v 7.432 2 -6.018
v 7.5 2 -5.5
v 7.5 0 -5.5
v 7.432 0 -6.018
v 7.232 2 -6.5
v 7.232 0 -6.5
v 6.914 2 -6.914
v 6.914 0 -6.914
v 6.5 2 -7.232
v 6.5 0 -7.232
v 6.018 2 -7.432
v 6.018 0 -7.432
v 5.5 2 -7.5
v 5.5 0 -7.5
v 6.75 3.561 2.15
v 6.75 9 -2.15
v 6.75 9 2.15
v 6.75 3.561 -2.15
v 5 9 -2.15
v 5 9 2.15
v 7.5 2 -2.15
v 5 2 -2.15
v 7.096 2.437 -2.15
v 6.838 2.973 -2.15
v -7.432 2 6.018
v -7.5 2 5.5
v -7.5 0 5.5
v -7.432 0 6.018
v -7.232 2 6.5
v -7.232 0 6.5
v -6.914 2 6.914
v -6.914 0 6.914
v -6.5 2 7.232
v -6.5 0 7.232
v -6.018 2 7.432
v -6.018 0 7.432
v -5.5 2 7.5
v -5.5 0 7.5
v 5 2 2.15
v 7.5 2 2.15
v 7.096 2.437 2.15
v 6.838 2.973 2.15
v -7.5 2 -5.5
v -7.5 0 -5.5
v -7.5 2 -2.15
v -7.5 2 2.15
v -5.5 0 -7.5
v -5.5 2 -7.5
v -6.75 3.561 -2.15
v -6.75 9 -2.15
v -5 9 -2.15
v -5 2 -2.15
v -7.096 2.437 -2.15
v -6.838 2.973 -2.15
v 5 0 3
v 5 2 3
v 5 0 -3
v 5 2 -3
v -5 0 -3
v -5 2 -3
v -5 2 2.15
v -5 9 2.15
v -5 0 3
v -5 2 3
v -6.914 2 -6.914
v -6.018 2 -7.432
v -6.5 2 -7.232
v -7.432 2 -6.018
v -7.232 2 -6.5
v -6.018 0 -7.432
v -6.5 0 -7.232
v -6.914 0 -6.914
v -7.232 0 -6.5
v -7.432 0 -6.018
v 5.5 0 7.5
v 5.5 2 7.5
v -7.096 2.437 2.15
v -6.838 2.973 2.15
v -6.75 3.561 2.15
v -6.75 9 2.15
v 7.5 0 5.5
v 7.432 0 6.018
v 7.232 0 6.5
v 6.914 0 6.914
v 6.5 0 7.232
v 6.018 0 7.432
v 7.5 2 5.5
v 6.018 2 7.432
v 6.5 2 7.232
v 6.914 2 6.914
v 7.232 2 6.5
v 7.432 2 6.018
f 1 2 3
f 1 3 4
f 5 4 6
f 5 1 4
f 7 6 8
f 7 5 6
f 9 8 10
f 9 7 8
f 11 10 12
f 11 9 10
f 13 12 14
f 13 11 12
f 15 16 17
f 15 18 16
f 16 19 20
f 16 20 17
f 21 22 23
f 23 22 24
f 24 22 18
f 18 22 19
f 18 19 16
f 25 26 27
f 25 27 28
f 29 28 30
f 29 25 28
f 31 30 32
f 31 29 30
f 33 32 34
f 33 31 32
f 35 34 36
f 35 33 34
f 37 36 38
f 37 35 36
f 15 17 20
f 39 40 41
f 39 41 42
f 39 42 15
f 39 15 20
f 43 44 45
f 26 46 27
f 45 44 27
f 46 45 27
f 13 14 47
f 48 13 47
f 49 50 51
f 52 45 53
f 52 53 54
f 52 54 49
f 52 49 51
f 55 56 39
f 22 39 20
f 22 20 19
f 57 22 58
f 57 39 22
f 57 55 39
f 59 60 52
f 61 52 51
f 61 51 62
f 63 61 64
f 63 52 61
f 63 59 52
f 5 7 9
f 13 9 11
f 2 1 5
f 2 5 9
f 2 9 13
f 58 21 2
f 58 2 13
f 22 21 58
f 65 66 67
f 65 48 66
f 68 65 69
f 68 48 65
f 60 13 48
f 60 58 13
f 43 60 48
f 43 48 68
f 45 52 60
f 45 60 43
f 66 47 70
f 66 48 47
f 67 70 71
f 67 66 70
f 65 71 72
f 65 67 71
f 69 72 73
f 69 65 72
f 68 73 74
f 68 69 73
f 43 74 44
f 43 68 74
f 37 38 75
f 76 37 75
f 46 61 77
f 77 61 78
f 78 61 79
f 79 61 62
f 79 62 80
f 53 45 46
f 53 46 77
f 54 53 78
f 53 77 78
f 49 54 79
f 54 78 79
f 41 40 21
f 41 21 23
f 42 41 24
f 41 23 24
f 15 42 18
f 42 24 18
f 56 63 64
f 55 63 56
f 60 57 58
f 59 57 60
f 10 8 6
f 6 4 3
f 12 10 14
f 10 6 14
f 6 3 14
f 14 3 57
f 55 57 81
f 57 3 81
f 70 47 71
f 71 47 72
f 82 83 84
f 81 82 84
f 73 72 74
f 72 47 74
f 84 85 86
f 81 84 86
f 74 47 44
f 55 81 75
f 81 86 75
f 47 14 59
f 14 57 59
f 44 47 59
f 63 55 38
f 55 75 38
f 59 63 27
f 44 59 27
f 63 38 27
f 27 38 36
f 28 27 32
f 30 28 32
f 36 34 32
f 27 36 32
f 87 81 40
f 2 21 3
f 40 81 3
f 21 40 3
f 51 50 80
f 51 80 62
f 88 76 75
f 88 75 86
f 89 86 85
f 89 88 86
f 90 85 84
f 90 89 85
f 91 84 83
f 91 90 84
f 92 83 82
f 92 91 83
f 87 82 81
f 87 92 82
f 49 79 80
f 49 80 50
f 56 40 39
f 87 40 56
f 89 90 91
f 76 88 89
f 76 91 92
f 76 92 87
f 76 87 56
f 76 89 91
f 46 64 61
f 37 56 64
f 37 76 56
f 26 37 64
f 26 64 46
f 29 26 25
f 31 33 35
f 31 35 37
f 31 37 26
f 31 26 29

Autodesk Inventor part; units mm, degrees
ref_plane "YZ Plane" through (0, 0, 0) normal (1, 0, 0) x (0, 1, 0)
ref_plane "XZ Plane" through (0, 0, 0) normal (0, 1, 0) x (-1, 0, 0)
ref_plane "XY Plane" through (0, 0, 0) normal (0, 0, 1) x (1, 0, 0)
sketch "スケッチ1" plane through (0, 0, 0) normal (0, 1, 0) x (-1, 0, 0)
  line L0 (7.5, 7.5) -> (-7.5, 7.5)
  line L1 (-7.5, 7.5) -> (-7.5, -7.5)
  line L2 (-7.5, -7.5) -> (7.5, -7.5)
  line L3 (7.5, -7.5) -> (7.5, 7.5)
  line L4 (7.5, 7.5) -> (-7.5, -7.5) construction
  line L5 (-7.5, 7.5) -> (7.5, -7.5) construction
  line L6 (5, 3) -> (-5, 3)
  line L7 (-5, 3) -> (-5, -3)
  line L8 (-5, -3) -> (5, -3)
  line L9 (5, -3) -> (5, 3)
  line L10 (5, 3) -> (-5, -3) construction
  line L11 (-5, 3) -> (5, -3) construction
  point P0 (0, 0)
  dimension "d0" = 15
  dimension "d1" = 15
  dimension "d2" = 10
  dimension "d3" = 6
extrude "押し出し1" add sketch "スケッチ1" along normal blind 2
sketch "スケッチ2" plane through (0, 2, 0) normal (0, 1, 0) x (1, 0, 0)
  line L0 (-6.75, 2.15) -> (6.75, 2.15)
  line L1 (6.75, 2.15) -> (6.75, -2.15)
  line L2 (6.75, -2.15) -> (-6.75, -2.15)
  line L3 (-6.75, -2.15) -> (-6.75, 2.15)
  line L4 (-6.75, 2.15) -> (6.75, -2.15) construction
  line L5 (6.75, 2.15) -> (-6.75, -2.15) construction
  line L6 (-5, -3) -> (-5, 3) projected
  line L7 (-5, 2.15) -> (-5, -2.15)
  line L8 (5, 3) -> (5, -3) projected
  line L9 (5, 2.15) -> (5, -2.15)
  point P0 (0, 0)
  dimension "d8" = 13.5
  dimension "d9" = 4.3
extrude "押し出し2" add sketch "スケッチ2" along normal blind 7 contours L0 L6 L2 L3 | L0 L1 L2 L8
fillet "フィレット1" radius 2 2 edges at (6.75, 2, 0) (-6.75, 2, 0)
fillet "フィレット2" radius 2 4 edges at (-7.5, 1, 7.5) (7.5, 1, 7.5) (7.5, 1, -7.5) (-7.5, 1, -7.5)
properties part number "LRA_case3"
